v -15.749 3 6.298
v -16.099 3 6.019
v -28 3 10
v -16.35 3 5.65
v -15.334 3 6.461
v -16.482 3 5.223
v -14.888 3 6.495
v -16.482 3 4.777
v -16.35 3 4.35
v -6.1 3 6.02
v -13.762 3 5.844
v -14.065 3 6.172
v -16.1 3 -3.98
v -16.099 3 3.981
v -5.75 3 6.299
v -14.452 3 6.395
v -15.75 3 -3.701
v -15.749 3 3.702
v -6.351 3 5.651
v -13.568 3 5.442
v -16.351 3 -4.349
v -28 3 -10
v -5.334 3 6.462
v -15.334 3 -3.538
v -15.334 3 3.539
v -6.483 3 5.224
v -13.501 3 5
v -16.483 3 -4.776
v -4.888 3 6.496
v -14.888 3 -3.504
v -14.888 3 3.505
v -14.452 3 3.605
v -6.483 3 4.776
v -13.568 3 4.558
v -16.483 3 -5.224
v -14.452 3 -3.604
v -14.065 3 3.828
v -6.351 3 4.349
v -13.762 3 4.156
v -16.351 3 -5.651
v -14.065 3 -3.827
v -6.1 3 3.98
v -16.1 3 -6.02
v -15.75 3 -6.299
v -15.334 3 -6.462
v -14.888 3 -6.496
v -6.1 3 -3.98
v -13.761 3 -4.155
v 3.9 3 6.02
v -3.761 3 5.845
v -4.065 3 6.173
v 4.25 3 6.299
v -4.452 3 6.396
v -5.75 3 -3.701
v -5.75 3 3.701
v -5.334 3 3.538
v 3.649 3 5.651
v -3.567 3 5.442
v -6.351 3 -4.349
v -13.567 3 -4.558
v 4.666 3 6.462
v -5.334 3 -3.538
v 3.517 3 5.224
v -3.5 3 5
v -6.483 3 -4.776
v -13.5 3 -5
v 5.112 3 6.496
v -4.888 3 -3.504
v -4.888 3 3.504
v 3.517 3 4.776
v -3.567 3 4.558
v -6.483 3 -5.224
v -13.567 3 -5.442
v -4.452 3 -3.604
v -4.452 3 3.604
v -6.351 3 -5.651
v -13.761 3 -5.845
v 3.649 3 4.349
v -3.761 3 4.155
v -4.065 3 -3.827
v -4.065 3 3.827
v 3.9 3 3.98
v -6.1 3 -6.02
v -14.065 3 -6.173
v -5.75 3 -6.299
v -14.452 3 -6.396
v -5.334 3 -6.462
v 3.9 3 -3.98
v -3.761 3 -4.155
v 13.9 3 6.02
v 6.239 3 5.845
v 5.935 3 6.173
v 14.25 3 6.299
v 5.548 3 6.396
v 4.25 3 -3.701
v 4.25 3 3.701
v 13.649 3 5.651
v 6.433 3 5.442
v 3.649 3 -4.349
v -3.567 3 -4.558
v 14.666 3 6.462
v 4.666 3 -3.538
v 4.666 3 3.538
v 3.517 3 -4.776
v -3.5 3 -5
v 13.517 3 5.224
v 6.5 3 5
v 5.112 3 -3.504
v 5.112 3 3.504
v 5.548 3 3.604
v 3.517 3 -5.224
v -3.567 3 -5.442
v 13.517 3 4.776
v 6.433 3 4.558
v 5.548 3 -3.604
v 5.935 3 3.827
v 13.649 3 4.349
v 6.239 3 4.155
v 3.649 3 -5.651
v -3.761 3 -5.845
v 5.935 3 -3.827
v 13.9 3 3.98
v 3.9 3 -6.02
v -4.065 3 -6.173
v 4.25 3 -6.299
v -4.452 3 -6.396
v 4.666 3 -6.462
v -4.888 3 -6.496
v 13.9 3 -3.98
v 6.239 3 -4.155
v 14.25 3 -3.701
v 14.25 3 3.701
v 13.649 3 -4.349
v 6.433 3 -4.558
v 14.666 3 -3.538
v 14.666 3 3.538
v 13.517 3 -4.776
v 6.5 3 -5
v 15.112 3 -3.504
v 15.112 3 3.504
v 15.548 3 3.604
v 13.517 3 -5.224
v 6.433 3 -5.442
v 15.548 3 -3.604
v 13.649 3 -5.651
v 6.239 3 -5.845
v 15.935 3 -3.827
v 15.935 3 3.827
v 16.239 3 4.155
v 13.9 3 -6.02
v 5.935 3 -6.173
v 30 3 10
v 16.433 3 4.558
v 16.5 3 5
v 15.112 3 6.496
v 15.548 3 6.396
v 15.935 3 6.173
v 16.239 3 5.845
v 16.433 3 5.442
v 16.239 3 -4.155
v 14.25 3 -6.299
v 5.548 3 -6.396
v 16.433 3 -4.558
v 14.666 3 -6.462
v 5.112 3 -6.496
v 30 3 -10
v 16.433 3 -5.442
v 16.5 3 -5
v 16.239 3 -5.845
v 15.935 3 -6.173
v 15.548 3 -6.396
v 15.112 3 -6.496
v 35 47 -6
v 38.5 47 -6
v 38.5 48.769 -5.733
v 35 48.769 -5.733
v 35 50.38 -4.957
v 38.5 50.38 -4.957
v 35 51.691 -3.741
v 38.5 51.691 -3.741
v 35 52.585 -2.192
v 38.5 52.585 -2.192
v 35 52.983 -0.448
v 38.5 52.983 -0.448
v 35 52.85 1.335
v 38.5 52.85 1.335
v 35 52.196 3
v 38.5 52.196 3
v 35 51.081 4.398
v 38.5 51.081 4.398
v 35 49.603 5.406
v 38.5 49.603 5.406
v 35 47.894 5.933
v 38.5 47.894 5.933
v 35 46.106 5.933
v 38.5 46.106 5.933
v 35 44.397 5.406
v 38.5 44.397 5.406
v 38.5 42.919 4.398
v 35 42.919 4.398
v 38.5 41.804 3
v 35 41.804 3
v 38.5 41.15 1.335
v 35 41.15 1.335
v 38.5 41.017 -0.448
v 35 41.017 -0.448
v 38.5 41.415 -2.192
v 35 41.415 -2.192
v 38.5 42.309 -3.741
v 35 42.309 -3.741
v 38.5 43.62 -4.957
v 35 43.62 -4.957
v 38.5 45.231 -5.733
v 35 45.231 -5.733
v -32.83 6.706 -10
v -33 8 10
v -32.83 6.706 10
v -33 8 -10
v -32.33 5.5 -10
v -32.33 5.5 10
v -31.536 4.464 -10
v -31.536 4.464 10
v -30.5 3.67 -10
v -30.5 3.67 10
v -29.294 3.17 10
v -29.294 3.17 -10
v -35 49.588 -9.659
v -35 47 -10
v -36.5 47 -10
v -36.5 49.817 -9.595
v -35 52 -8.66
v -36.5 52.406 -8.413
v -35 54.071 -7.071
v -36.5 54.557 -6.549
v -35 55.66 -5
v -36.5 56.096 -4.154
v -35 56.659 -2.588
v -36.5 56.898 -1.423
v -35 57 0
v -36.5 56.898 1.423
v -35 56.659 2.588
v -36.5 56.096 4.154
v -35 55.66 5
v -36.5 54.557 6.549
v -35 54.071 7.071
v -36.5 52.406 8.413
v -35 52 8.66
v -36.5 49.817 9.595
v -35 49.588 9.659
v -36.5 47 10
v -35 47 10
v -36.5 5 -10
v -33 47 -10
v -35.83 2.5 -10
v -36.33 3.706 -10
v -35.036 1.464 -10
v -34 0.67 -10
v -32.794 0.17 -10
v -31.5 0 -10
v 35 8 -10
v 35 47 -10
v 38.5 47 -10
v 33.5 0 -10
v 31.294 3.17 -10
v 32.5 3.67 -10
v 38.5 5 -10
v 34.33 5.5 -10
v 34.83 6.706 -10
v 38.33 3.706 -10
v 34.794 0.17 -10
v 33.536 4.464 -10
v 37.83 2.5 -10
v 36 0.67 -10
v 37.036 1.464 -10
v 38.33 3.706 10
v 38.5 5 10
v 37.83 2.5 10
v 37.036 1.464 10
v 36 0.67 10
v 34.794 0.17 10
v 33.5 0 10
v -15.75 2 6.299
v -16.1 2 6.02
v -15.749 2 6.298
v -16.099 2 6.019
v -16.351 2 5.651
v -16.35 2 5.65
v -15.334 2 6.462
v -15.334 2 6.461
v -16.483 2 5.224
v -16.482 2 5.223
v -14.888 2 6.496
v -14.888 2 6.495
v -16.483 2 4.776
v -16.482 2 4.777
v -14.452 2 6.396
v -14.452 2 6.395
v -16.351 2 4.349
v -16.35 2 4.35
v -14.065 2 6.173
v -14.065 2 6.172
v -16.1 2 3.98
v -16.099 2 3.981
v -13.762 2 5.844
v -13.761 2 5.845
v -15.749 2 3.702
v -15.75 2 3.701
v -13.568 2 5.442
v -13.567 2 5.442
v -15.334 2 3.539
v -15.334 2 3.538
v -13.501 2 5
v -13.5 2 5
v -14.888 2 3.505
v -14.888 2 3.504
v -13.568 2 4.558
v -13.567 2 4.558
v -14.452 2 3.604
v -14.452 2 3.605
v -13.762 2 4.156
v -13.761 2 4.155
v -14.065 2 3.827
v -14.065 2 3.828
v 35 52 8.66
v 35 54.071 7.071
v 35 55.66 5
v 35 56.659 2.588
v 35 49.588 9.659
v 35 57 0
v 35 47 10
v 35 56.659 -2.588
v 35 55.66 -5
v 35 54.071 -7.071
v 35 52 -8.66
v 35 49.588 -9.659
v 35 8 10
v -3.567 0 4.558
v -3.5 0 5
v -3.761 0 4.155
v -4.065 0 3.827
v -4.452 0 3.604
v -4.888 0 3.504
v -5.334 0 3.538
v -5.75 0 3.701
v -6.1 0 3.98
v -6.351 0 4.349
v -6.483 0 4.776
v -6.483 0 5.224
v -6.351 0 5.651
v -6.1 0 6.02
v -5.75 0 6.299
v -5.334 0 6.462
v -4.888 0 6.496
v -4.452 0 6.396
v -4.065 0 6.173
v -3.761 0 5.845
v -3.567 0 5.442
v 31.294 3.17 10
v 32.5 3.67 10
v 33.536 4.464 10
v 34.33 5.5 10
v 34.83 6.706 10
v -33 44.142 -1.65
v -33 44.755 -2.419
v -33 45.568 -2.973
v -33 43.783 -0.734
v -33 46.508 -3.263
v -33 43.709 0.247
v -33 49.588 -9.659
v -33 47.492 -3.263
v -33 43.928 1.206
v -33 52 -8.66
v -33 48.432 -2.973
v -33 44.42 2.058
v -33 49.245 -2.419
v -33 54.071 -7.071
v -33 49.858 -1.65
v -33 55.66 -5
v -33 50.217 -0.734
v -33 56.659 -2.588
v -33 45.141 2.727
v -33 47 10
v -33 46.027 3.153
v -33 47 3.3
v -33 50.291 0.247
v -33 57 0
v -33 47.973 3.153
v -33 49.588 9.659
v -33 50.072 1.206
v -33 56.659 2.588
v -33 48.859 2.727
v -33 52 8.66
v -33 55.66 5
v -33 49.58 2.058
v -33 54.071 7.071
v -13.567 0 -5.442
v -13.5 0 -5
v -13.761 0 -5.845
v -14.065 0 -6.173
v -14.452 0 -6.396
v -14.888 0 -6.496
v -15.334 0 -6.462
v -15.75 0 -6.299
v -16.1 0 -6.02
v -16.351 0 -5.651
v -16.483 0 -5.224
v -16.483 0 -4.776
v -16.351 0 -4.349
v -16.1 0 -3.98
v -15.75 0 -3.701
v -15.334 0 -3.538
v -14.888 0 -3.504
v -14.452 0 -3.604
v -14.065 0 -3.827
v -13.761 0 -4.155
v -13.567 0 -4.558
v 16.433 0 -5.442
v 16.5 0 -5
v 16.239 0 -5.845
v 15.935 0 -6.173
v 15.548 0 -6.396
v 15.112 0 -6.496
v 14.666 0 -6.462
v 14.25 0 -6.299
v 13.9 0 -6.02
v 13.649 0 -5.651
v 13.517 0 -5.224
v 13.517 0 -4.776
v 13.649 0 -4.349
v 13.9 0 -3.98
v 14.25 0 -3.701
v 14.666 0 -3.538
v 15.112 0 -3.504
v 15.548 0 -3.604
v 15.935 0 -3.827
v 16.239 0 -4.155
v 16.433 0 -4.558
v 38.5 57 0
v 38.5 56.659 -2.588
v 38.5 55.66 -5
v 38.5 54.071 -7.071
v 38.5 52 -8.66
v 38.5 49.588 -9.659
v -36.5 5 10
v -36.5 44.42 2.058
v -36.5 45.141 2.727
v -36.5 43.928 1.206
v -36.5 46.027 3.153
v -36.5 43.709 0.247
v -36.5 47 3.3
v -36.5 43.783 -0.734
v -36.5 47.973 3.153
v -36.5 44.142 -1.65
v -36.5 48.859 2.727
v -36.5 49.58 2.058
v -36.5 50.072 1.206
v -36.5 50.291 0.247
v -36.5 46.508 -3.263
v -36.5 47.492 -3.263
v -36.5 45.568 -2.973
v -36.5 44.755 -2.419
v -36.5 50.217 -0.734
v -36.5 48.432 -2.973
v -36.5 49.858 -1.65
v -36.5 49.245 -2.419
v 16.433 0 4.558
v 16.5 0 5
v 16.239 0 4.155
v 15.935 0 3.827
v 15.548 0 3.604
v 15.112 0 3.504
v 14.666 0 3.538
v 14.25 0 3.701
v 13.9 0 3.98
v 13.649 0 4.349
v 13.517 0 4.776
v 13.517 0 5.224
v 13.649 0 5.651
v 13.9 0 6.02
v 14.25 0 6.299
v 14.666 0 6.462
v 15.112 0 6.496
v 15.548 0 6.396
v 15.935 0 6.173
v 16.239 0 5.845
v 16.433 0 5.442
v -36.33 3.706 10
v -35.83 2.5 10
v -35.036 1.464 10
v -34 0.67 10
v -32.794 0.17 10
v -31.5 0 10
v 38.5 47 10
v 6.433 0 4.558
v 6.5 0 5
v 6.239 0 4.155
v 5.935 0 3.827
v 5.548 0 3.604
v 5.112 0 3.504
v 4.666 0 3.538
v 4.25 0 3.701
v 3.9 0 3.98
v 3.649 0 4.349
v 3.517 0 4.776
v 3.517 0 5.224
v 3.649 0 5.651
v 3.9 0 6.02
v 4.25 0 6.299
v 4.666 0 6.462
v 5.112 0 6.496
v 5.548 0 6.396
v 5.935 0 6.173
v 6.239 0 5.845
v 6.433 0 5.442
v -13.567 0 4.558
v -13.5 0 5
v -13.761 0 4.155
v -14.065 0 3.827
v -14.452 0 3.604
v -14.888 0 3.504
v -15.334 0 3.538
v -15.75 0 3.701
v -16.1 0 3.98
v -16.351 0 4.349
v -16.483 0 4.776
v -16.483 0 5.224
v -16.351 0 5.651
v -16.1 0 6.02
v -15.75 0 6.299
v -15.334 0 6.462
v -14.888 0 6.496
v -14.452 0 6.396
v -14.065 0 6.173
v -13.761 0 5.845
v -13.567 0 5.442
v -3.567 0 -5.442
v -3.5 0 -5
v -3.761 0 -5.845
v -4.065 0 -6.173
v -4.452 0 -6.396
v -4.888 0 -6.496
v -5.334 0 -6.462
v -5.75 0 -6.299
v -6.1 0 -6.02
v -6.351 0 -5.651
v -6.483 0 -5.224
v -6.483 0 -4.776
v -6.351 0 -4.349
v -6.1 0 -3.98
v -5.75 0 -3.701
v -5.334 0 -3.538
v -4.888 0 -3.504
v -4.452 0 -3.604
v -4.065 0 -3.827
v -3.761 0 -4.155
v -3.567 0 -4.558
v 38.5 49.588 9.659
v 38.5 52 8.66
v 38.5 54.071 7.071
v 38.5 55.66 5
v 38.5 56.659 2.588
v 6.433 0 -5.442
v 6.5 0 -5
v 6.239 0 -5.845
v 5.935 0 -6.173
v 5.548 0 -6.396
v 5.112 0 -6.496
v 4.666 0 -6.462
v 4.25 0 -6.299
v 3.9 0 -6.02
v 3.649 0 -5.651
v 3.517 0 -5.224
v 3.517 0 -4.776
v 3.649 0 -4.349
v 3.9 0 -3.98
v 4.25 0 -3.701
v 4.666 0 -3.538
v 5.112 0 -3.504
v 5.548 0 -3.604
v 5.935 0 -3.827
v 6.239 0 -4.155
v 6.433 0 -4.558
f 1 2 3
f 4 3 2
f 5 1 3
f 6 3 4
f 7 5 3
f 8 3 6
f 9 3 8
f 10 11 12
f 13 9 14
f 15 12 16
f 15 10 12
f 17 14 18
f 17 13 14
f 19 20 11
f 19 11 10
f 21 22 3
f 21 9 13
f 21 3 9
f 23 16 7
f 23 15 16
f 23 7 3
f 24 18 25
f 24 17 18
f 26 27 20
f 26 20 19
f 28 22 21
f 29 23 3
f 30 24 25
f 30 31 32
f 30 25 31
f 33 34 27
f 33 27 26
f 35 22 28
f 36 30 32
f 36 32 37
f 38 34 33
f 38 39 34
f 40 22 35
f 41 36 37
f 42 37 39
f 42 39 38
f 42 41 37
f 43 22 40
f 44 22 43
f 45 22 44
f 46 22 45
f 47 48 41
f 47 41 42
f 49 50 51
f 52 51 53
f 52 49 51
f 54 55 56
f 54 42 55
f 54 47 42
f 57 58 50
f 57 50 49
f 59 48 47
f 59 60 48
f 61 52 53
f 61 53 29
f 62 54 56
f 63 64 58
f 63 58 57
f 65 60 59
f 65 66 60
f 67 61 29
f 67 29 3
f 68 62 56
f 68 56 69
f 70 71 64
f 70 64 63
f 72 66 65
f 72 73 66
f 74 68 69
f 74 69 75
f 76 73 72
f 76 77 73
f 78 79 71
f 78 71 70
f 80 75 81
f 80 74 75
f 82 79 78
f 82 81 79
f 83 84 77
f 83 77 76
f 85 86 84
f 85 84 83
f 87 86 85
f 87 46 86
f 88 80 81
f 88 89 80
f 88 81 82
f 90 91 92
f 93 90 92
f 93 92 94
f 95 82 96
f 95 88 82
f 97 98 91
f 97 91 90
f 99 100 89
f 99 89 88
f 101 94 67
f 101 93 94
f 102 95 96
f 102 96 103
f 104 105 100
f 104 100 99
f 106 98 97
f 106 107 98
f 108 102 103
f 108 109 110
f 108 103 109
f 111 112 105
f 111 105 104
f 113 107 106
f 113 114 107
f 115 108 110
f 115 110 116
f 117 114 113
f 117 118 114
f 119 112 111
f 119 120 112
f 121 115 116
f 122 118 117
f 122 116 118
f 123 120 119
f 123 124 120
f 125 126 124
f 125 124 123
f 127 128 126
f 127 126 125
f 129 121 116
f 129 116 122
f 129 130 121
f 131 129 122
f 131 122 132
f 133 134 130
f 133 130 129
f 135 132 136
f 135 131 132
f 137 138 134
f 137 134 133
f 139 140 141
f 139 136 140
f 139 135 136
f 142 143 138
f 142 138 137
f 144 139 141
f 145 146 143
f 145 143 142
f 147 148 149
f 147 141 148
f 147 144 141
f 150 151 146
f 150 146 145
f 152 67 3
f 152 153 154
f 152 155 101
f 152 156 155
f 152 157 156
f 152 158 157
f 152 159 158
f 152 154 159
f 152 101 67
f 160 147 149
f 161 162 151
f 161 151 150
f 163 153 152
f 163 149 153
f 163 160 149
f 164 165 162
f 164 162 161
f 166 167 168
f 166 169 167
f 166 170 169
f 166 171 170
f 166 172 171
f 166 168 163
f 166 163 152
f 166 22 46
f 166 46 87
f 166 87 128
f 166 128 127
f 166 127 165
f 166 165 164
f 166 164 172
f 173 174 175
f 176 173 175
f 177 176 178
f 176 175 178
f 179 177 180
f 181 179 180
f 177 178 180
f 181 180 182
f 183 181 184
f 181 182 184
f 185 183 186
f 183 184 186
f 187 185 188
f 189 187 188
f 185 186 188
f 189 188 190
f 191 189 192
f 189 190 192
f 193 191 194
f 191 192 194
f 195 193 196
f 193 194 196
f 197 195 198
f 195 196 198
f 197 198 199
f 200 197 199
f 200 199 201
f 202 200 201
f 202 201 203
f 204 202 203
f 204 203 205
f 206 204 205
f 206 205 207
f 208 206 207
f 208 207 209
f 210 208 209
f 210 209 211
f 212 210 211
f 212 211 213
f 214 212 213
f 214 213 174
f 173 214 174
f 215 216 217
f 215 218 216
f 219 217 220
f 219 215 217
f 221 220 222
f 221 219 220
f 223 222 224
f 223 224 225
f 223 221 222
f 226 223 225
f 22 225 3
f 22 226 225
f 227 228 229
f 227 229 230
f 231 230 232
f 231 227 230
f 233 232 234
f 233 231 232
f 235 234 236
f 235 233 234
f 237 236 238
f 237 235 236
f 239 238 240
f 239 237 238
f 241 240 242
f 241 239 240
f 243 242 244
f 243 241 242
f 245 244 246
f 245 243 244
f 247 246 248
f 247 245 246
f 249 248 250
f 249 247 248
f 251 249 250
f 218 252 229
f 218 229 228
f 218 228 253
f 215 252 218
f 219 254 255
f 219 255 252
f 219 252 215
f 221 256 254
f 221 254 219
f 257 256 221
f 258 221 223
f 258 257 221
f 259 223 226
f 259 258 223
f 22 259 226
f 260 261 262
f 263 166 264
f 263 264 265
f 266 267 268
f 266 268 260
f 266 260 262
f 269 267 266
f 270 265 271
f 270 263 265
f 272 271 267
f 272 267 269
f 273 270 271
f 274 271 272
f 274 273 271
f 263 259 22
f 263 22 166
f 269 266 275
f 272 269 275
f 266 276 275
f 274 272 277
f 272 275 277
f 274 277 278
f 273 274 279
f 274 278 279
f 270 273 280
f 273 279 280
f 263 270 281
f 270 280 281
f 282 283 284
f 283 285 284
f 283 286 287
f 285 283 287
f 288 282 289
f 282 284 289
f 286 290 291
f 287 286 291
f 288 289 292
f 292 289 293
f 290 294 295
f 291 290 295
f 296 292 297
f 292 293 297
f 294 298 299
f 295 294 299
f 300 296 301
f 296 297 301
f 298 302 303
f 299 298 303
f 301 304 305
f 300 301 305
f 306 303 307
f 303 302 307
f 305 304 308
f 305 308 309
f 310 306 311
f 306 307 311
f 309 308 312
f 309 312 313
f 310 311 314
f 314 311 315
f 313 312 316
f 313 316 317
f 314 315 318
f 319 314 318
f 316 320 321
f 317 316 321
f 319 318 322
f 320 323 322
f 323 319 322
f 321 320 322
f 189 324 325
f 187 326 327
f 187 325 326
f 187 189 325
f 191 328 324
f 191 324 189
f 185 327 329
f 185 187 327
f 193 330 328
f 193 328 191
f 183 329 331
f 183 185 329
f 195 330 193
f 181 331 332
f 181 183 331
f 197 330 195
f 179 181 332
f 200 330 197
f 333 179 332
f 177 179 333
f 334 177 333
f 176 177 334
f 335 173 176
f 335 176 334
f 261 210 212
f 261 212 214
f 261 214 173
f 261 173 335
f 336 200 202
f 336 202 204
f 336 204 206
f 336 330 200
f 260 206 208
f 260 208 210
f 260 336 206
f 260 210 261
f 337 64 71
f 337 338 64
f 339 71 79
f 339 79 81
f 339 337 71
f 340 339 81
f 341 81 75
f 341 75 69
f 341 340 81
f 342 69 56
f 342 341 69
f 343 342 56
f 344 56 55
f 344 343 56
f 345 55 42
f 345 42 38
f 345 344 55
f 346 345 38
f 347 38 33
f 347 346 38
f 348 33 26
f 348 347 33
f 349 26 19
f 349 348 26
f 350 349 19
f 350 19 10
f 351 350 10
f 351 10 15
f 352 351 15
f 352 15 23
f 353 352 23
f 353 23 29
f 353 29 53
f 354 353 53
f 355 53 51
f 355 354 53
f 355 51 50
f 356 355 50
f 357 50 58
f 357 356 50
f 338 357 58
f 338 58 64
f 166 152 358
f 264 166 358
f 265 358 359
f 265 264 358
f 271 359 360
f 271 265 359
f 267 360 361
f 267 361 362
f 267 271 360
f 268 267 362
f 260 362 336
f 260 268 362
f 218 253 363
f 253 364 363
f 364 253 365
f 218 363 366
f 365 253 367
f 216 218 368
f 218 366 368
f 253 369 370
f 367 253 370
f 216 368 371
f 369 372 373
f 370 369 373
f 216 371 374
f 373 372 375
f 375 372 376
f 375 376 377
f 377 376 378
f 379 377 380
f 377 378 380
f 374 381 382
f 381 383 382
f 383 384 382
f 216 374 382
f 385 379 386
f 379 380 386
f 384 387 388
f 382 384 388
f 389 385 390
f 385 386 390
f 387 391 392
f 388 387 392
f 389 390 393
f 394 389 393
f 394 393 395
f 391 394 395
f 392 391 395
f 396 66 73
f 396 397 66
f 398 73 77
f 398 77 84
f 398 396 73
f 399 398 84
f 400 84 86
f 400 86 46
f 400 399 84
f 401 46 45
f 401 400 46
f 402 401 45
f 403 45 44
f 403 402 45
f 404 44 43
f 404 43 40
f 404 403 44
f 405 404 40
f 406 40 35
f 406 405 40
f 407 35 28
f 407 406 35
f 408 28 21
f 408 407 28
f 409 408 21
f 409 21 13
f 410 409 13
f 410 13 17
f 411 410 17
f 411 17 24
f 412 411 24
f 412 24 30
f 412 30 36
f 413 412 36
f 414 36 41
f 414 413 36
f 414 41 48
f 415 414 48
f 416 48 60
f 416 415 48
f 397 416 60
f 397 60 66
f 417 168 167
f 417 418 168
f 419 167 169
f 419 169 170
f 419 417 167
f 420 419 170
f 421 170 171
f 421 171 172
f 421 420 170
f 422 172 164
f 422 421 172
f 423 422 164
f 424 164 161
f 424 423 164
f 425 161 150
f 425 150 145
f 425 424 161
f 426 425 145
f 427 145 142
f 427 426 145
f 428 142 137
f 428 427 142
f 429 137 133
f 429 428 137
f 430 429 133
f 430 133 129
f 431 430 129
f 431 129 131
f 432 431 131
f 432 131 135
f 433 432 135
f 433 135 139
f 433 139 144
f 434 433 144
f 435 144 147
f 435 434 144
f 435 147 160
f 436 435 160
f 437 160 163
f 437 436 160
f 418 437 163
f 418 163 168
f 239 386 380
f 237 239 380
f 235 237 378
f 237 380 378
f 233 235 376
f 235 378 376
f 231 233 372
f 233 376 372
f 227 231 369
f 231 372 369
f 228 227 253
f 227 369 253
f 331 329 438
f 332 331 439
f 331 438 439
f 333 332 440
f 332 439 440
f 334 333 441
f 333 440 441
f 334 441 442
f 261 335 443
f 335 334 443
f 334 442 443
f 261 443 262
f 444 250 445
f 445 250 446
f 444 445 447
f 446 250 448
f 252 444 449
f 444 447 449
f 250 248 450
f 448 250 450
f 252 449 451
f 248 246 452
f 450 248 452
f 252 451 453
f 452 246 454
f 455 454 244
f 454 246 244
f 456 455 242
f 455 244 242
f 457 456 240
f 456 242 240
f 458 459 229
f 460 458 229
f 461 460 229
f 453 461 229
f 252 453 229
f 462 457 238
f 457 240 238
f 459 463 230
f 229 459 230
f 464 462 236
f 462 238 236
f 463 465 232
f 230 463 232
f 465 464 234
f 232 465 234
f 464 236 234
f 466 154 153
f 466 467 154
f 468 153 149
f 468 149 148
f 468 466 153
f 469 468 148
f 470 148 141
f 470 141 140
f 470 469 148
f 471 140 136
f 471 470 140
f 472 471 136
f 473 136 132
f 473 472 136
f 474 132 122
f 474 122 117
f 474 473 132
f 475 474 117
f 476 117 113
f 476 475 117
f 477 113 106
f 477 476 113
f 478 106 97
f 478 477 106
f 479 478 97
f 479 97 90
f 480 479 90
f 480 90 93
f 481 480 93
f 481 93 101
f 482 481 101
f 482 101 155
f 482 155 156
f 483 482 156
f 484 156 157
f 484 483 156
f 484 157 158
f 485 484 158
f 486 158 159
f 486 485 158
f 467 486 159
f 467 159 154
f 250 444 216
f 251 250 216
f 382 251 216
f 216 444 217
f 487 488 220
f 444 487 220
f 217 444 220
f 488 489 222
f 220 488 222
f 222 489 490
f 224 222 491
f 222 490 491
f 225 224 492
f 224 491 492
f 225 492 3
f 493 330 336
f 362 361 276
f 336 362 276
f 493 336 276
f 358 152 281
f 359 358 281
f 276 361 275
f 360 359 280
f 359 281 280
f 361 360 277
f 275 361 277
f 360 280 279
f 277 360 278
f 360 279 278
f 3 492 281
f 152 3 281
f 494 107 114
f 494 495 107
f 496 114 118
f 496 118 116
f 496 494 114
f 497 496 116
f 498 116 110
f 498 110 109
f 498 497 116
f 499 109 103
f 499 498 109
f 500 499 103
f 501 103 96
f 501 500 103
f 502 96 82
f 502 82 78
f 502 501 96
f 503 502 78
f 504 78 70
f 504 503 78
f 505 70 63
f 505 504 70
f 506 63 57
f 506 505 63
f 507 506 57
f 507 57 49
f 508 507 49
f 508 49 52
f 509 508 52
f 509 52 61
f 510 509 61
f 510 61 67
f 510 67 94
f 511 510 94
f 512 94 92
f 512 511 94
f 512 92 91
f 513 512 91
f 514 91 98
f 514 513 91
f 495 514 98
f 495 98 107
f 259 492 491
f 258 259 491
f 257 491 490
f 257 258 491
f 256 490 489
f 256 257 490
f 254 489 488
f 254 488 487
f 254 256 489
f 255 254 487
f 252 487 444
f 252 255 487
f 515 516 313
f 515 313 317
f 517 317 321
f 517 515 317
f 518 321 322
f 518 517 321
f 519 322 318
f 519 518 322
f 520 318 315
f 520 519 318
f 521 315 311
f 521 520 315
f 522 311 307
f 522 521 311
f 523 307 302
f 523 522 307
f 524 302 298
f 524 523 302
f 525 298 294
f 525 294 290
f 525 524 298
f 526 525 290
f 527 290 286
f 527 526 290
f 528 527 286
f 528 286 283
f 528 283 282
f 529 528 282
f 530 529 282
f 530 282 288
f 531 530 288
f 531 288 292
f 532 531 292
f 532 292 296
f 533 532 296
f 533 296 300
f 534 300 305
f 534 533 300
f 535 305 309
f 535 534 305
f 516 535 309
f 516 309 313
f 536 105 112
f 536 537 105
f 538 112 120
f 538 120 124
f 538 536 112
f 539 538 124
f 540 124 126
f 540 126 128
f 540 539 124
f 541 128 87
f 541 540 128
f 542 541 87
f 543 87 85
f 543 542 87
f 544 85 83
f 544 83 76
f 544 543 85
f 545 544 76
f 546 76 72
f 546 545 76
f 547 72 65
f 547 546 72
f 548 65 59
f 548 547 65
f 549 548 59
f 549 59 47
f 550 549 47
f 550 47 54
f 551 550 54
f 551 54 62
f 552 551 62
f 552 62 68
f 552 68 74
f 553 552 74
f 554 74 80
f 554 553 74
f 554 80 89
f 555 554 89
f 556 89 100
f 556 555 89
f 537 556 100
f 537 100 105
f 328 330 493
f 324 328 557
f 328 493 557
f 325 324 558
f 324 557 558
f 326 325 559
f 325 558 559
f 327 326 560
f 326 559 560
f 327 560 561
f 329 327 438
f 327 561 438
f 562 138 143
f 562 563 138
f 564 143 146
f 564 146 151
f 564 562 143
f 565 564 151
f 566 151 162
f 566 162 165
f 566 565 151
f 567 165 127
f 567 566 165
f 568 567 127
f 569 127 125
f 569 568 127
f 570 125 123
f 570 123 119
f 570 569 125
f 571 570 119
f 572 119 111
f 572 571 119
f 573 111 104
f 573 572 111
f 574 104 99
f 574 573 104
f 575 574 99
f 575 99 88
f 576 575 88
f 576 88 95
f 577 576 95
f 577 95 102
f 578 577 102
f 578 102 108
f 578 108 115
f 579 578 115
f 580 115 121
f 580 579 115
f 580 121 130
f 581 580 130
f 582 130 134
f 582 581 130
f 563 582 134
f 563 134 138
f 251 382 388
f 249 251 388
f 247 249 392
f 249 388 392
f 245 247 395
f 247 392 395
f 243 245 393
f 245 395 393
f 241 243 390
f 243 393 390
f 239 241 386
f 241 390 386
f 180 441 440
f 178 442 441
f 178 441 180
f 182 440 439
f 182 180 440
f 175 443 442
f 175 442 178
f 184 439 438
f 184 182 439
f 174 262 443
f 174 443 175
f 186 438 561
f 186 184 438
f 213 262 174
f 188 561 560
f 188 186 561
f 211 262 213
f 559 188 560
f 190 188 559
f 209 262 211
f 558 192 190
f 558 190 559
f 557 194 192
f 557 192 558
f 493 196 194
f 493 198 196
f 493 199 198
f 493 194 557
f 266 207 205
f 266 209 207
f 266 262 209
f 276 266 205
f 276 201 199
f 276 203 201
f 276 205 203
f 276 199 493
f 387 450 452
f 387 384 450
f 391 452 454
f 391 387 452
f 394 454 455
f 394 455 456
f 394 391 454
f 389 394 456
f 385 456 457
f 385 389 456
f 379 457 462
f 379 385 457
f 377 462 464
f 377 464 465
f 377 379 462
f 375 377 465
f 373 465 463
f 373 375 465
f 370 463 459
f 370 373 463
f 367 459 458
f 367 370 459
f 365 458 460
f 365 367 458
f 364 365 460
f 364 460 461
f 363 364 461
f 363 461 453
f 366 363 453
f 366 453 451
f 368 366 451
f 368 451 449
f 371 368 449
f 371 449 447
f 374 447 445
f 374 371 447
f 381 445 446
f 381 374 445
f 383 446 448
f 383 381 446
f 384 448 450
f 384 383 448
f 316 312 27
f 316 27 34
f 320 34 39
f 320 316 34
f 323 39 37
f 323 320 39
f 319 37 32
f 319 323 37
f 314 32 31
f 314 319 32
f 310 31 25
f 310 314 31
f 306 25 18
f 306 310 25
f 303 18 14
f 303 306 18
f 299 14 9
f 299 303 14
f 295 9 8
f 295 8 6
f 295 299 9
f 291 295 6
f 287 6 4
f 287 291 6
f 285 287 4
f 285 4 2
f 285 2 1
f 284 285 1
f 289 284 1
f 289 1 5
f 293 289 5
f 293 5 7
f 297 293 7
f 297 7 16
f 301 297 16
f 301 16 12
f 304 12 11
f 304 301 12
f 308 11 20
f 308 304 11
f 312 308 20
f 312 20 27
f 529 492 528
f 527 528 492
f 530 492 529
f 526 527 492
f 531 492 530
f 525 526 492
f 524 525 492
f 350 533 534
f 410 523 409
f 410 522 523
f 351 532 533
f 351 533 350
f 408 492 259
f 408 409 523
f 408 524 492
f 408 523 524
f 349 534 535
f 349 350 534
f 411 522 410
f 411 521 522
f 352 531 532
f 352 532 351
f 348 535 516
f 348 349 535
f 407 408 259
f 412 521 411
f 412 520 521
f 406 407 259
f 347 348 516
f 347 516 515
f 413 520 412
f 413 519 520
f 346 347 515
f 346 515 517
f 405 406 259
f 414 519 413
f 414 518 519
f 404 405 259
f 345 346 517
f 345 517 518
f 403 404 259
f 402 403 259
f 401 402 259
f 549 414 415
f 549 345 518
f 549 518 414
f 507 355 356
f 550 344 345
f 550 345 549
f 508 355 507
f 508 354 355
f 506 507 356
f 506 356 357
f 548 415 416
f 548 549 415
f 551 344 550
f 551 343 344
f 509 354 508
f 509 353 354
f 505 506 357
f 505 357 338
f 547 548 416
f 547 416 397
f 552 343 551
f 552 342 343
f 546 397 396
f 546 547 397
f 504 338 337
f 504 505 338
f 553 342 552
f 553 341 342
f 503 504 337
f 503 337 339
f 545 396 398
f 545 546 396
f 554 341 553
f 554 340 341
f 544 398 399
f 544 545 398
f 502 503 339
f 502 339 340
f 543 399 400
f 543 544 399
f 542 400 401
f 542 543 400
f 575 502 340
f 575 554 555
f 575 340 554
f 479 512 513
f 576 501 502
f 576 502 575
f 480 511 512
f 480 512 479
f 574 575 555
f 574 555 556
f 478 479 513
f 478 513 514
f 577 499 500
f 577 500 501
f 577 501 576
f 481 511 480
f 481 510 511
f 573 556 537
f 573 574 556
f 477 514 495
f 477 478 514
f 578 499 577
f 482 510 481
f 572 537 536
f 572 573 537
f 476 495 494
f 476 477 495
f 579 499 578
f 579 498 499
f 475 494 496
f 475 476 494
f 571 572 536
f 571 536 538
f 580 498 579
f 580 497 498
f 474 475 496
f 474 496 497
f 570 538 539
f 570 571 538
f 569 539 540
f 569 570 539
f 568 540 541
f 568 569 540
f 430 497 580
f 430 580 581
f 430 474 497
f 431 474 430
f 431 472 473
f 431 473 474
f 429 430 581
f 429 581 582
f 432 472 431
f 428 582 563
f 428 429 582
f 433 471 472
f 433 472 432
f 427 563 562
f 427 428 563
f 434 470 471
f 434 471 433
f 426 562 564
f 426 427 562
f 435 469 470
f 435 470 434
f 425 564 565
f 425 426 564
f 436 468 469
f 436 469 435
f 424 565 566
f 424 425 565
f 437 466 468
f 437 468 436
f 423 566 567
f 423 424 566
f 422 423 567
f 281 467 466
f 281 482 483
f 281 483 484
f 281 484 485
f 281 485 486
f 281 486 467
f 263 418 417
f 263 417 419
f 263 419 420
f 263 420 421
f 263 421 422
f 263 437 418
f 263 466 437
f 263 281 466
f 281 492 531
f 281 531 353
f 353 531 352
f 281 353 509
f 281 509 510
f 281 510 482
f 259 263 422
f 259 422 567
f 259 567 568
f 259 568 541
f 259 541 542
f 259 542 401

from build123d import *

# Parameters (mm, degrees)
SKETCH_2_R          = 1.5
EXTRUDE_1_DEPTH     = 2
SKETCH_3_W          = 2
SKETCH_3_H          = 20
SKETCH_3_W_2        = 3.5
EXTRUDE_2_DEPTH     = 55
SKETCH_9_R          = 6
CUT_EXTRUDE_1_DEPTH = 87
SKETCH_7_R          = 6
SKETCH_7_R_2        = 3.3
EXTRUDE_3_DEPTH     = 2
SKETCH_10_R         = 3.3
EXTRUDE_4_DEPTH     = 1.5
SKETCH_11_W         = 68
SKETCH_11_H         = 20
SKETCH_11_R         = 1.5
SKETCH_11_R_2       = 1.498871695
EXTRUDE_5_DEPTH     = 1
FILLET_6_R          = 5
FILLET_7_R          = 5
FILLET_8_R          = 5


with BuildPart() as part:
    # 스케치2 → 보스-돌출1 (new body)
    with BuildSketch(Plane(origin=(0, 0, 0), x_dir=(1, 0, 0), z_dir=(0, 1, 0))):
        Polygon((35, -10), (-35, -10), (-35, 10), (35, 10), (38.5, 10), (38.5, -10), align=None)
        with Locations((-15, 5)):
            Circle(SKETCH_2_R, mode=Mode.SUBTRACT)
        with Locations((-5, 5)):
            Circle(SKETCH_2_R, mode=Mode.SUBTRACT)
        with Locations((-15, -5)):
            Circle(SKETCH_2_R, mode=Mode.SUBTRACT)
        with Locations((-5, -5)):
            Circle(SKETCH_2_R, mode=Mode.SUBTRACT)
        with Locations((15, -5)):
            Circle(SKETCH_2_R, mode=Mode.SUBTRACT)
        with Locations((5, -5)):
            Circle(SKETCH_2_R, mode=Mode.SUBTRACT)
        with Locations((5, 5)):
            Circle(SKETCH_2_R, mode=Mode.SUBTRACT)
        with Locations((15, 5)):
            Circle(SKETCH_2_R, mode=Mode.SUBTRACT)
    extrude(amount=EXTRUDE_1_DEPTH)

    # 스케치3 → 보스-돌출2 (add)
    with BuildSketch(Plane(origin=(0, 2, 0), x_dir=(1, 0, 0), z_dir=(0, 1, 0))):
        with Locations((-34, 0)):
            Rectangle(SKETCH_3_W, SKETCH_3_H)
        with Locations((36.75, 0)):
            Rectangle(SKETCH_3_W_2, SKETCH_3_H)
    extrude(amount=EXTRUDE_2_DEPTH)

    # 스케치9 → 컷-돌출1 (cut)
    with BuildSketch(Plane(origin=(38.5, 0, 0), x_dir=(0, 0, -1), z_dir=(1, 0, 0))):
        with BuildLine():
            Line((10, 57), (0, 57))
            ThreePointArc((0, 57), (7.071067812, 54.071067812), (10, 47))
            Line((10, 47), (10, 57))
        make_face()
        with BuildLine():
            Line((-10, 57), (-10, 47))
            ThreePointArc((-10, 47), (-7.071067812, 54.071067812), (0, 57))
            Line((0, 57), (-10, 57))
        make_face()
        with Locations((0, 47)):
            Circle(SKETCH_9_R)
    extrude(amount=-CUT_EXTRUDE_1_DEPTH, mode=Mode.SUBTRACT)

    # 스케치7 → 보스-돌출3 (add)
    with BuildSketch(Plane.ZY.offset(35)):
        with Locations((0, 47)):
            Circle(SKETCH_7_R)
        with Locations((0, 47)):
            Circle(SKETCH_7_R_2, mode=Mode.SUBTRACT)
    extrude(amount=-EXTRUDE_3_DEPTH)

    # 스케치10 → 보스-돌출4 (add)
    with BuildSketch(Plane.ZY.offset(35)):
        with BuildLine():
            ThreePointArc((-10, 47), (0, 57), (10, 47))
            Line((10, 47), (10, 0))
            Line((10, 0), (-10, 0))
            Line((-10, 0), (-10, 47))
        make_face()
        with Locations((0, 47)):
            Circle(SKETCH_10_R, mode=Mode.SUBTRACT)
    extrude(amount=EXTRUDE_4_DEPTH)

    # 스케치11 → 보스-돌출5 (add)
    with BuildSketch(Plane(origin=(0, 2, 0), x_dir=(1, 0, 0), z_dir=(0, 1, 0))):
        with Locations((1, 0)):
            Rectangle(SKETCH_11_W, SKETCH_11_H)
        with Locations((-15, 5)):
            Circle(SKETCH_11_R, mode=Mode.SUBTRACT)
        with Locations((-5, 5)):
            Circle(SKETCH_11_R, mode=Mode.SUBTRACT)
        with Locations((5, 5)):
            Circle(SKETCH_11_R, mode=Mode.SUBTRACT)
        with Locations((15, 5)):
            Circle(SKETCH_11_R, mode=Mode.SUBTRACT)
        with Locations((15, -5)):
            Circle(SKETCH_11_R, mode=Mode.SUBTRACT)
        with Locations((5, -5)):
            Circle(SKETCH_11_R, mode=Mode.SUBTRACT)
        with Locations((-5, -5)):
            Circle(SKETCH_11_R, mode=Mode.SUBTRACT)
        with Locations((-15, -5)):
            Circle(SKETCH_11_R_2, mode=Mode.SUBTRACT)
    extrude(amount=EXTRUDE_5_DEPTH)

    # 필렛6
    fillet_6_edges = [part.edges().sort_by_distance(p)[0] for p in [
        (-33, 3, 0),
    ]]
    fillet(fillet_6_edges, radius=FILLET_6_R)

    # 필렛7
    fillet_7_edges = [part.edges().sort_by_distance(p)[0] for p in [
        (35, 3, 0),
    ]]
    fillet(fillet_7_edges, radius=FILLET_7_R)

    # 필렛8
    fillet_8_edges = [part.edges().sort_by_distance(p)[0] for p in [
        (-36.5, 0, 0),
        (38.5, 0, 0),
    ]]
    fillet(fillet_8_edges, radius=FILLET_8_R)


solid = part.part
